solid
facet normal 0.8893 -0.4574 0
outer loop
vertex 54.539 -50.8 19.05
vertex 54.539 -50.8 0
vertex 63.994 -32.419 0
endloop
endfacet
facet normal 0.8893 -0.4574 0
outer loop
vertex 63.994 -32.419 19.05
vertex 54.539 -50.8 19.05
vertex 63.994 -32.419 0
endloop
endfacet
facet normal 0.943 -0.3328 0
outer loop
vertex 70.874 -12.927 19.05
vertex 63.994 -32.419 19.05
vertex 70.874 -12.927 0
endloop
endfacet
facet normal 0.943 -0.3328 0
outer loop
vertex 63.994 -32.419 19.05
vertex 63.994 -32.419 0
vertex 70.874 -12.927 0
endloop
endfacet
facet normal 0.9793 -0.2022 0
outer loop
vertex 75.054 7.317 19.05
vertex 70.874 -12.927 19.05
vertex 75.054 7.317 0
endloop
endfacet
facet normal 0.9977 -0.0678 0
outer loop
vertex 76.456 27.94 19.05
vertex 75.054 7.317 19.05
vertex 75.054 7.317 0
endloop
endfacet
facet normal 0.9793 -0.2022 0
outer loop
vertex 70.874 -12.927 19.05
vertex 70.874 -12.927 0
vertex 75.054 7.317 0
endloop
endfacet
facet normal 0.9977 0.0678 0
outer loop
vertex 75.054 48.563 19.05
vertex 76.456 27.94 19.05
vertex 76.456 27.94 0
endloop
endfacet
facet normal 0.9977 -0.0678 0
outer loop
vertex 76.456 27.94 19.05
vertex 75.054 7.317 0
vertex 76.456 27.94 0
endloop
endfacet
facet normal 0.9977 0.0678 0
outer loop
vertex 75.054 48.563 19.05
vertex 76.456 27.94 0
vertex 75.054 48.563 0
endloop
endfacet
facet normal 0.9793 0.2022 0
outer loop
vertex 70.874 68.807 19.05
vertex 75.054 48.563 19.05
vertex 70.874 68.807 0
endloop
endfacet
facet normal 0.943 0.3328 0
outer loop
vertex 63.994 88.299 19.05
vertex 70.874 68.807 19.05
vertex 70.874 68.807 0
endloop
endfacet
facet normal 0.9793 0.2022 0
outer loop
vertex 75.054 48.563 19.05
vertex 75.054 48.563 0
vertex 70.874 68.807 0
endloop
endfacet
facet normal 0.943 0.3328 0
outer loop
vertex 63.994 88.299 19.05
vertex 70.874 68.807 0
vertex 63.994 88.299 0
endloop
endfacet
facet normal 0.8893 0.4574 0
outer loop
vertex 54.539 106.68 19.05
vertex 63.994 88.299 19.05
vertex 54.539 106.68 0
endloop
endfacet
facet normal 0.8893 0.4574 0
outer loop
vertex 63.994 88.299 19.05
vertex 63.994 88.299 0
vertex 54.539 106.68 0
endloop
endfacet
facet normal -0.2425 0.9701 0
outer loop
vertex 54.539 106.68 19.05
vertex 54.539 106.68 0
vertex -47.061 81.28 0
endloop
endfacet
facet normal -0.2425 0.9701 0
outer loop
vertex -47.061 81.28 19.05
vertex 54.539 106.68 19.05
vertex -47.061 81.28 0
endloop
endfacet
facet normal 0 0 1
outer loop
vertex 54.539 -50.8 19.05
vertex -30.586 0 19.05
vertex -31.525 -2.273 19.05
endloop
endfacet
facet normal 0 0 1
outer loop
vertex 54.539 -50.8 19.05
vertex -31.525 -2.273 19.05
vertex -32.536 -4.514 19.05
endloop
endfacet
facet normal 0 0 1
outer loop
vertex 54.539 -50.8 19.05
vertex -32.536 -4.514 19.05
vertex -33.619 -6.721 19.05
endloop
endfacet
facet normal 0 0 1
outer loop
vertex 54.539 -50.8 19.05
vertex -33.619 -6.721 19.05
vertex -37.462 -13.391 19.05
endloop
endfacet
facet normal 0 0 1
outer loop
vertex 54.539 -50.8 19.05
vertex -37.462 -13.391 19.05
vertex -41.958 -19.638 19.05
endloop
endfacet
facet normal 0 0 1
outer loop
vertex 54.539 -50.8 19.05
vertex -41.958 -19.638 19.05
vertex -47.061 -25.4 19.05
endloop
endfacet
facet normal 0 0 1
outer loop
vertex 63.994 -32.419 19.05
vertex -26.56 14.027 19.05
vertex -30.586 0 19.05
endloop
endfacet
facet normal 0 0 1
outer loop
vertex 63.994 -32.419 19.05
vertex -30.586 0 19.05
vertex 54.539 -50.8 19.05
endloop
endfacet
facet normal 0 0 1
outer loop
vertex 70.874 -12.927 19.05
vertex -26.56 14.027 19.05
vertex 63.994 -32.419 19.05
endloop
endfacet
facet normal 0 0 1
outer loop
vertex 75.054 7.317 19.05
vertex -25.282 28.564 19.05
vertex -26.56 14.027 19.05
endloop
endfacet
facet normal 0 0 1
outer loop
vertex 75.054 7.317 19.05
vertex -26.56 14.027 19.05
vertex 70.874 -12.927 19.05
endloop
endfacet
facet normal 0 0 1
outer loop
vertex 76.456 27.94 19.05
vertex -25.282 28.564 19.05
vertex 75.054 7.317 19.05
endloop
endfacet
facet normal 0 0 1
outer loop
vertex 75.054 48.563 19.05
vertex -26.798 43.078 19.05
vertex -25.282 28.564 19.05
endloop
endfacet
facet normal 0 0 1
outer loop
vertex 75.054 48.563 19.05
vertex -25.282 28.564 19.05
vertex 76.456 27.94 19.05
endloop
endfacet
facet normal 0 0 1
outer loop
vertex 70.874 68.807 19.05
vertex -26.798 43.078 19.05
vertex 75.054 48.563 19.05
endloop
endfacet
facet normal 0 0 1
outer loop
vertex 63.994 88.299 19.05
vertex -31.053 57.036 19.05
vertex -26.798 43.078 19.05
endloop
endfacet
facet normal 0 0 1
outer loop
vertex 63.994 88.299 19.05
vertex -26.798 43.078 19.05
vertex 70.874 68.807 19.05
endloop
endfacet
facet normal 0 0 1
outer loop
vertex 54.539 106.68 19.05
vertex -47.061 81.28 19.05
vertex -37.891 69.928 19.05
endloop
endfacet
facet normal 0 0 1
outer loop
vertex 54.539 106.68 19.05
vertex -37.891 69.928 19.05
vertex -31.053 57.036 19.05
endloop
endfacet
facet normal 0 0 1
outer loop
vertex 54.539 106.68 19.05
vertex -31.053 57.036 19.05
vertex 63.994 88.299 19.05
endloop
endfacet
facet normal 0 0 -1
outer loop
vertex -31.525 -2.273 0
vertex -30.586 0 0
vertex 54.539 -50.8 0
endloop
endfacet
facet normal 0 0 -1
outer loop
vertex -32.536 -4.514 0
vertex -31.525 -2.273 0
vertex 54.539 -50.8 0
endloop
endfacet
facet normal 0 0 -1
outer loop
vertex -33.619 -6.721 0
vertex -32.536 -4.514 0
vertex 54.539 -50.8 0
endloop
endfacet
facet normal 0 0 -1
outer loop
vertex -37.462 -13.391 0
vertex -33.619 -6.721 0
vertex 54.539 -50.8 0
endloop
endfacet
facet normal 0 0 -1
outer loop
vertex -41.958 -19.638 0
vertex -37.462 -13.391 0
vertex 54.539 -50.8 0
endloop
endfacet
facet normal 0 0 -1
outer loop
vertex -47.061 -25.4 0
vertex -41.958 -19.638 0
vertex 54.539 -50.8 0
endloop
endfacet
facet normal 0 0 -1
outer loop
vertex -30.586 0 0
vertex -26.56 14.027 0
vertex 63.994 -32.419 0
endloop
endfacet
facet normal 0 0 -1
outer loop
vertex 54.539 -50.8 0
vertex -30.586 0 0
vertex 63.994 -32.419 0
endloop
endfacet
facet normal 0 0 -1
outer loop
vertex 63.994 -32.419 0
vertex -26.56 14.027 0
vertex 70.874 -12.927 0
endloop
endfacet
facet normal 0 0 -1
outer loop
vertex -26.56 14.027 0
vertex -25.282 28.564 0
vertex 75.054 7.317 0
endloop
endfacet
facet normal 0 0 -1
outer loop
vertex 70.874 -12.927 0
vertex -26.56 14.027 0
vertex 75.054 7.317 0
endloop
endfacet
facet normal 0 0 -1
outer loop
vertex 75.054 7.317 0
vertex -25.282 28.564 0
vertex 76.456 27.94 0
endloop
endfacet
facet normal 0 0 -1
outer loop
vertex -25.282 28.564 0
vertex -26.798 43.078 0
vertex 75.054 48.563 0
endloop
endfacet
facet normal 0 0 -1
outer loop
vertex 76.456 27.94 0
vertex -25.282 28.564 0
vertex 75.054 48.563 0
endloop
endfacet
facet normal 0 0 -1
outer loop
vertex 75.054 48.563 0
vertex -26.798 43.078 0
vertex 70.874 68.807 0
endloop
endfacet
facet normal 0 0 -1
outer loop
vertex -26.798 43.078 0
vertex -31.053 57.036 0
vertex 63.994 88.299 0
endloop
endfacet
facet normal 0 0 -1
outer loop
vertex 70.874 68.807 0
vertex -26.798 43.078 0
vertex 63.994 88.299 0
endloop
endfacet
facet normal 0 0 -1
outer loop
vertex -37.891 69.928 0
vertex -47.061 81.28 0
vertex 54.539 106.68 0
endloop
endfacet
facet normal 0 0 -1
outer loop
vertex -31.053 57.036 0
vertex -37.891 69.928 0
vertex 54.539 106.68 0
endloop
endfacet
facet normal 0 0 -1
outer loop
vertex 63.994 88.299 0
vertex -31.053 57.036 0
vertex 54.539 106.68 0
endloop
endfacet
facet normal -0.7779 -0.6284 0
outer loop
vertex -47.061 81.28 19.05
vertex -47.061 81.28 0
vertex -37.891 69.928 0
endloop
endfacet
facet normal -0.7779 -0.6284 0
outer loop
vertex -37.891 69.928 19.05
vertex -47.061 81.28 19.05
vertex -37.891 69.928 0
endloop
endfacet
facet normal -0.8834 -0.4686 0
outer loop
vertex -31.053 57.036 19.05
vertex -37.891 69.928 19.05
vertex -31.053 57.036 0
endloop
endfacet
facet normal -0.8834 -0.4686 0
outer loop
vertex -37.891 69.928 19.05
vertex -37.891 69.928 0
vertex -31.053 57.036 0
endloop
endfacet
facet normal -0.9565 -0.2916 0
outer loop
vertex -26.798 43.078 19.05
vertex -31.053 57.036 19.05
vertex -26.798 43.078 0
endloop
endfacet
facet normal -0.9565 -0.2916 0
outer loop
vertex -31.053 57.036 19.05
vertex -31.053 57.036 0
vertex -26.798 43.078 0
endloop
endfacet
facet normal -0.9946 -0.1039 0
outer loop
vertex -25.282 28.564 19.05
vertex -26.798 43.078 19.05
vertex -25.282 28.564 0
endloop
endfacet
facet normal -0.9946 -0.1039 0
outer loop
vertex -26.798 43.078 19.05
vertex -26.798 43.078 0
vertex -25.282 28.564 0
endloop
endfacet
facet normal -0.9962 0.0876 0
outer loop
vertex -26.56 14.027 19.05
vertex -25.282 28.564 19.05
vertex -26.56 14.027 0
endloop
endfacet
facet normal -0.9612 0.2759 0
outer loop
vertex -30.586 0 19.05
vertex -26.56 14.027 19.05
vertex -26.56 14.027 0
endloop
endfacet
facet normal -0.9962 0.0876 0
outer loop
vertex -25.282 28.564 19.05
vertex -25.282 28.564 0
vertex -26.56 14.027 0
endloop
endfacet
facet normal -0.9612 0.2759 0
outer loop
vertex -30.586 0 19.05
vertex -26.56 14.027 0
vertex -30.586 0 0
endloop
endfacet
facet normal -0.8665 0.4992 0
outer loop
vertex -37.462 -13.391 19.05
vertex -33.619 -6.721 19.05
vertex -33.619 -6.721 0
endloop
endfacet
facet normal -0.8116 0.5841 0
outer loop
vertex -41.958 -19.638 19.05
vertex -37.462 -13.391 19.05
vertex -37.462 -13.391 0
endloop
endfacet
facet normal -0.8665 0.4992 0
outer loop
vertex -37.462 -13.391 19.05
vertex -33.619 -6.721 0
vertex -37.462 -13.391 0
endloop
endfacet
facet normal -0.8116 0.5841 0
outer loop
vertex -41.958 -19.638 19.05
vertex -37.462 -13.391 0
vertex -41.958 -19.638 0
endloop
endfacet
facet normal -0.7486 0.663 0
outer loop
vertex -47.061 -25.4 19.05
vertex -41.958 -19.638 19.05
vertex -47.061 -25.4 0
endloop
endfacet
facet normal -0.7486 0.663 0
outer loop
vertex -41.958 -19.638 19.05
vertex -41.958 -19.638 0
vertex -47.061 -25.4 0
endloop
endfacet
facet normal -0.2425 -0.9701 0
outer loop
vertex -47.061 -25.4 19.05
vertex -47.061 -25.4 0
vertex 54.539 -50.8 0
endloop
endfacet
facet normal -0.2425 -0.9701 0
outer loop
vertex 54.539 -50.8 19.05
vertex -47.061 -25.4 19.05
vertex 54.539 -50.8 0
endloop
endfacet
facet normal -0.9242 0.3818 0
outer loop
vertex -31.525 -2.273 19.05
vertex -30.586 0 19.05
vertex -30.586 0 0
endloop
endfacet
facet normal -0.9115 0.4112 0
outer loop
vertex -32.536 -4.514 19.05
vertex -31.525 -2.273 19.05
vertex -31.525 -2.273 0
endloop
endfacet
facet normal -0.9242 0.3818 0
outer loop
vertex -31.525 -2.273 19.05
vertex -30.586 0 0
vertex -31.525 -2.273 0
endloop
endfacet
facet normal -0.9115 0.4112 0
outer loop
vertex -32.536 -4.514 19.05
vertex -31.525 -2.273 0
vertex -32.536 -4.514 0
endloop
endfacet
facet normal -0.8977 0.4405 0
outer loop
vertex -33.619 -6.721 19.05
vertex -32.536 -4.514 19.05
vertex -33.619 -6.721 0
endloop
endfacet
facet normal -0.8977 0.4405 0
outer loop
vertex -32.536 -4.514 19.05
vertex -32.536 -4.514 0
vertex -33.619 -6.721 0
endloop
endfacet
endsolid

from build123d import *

# Parameters (mm, degrees)
F1_DEPTH = 19.05


with BuildPart() as f1:
    # F0 (on Top) → F1 (new body)
    with BuildSketch(Plane.XY):
        with BuildLine():
            Line((-30.586306, 0), (4.838097, 0))
            Line((4.838097, 0), (54.538528, 0))
            Line((54.538528, 0), (54.538528, 106.68))
            Line((54.538528, 106.68), (-47.061472, 81.28))
            ThreePointArc((-47.061472, 81.28), (-26.797886, 43.077628), (-30.586306, 0))
        make_face()
        with BuildLine():
            Line((54.538528, 0), (4.838097, 0))
            Line((4.838097, 0), (-30.586306, 0))
            ThreePointArc((-30.586306, 0), (-32.021192, -3.397376), (-33.618778, -6.721347))
            Line((-33.618778, -6.721347), (54.538528, -50.8))
            Line((54.538528, -50.8), (54.538528, 0))
        make_face()
        with BuildLine():
            Line((54.538528, -50.8), (-33.618778, -6.721347))
            ThreePointArc((-33.618778, -6.721347), (-39.630922, -16.571075), (-47.061472, -25.4))
            Line((-47.061472, -25.4), (54.538528, -50.8))
        make_face()
        with BuildLine():
            Line((54.538528, 106.68), (54.538528, 0))
            Line((54.538528, 0), (54.538528, -50.8))
            ThreePointArc((54.538528, -50.8), (76.455684, 27.94), (54.538528, 106.68))
        make_face()
    extrude(amount=F1_DEPTH)


solid = f1.part
